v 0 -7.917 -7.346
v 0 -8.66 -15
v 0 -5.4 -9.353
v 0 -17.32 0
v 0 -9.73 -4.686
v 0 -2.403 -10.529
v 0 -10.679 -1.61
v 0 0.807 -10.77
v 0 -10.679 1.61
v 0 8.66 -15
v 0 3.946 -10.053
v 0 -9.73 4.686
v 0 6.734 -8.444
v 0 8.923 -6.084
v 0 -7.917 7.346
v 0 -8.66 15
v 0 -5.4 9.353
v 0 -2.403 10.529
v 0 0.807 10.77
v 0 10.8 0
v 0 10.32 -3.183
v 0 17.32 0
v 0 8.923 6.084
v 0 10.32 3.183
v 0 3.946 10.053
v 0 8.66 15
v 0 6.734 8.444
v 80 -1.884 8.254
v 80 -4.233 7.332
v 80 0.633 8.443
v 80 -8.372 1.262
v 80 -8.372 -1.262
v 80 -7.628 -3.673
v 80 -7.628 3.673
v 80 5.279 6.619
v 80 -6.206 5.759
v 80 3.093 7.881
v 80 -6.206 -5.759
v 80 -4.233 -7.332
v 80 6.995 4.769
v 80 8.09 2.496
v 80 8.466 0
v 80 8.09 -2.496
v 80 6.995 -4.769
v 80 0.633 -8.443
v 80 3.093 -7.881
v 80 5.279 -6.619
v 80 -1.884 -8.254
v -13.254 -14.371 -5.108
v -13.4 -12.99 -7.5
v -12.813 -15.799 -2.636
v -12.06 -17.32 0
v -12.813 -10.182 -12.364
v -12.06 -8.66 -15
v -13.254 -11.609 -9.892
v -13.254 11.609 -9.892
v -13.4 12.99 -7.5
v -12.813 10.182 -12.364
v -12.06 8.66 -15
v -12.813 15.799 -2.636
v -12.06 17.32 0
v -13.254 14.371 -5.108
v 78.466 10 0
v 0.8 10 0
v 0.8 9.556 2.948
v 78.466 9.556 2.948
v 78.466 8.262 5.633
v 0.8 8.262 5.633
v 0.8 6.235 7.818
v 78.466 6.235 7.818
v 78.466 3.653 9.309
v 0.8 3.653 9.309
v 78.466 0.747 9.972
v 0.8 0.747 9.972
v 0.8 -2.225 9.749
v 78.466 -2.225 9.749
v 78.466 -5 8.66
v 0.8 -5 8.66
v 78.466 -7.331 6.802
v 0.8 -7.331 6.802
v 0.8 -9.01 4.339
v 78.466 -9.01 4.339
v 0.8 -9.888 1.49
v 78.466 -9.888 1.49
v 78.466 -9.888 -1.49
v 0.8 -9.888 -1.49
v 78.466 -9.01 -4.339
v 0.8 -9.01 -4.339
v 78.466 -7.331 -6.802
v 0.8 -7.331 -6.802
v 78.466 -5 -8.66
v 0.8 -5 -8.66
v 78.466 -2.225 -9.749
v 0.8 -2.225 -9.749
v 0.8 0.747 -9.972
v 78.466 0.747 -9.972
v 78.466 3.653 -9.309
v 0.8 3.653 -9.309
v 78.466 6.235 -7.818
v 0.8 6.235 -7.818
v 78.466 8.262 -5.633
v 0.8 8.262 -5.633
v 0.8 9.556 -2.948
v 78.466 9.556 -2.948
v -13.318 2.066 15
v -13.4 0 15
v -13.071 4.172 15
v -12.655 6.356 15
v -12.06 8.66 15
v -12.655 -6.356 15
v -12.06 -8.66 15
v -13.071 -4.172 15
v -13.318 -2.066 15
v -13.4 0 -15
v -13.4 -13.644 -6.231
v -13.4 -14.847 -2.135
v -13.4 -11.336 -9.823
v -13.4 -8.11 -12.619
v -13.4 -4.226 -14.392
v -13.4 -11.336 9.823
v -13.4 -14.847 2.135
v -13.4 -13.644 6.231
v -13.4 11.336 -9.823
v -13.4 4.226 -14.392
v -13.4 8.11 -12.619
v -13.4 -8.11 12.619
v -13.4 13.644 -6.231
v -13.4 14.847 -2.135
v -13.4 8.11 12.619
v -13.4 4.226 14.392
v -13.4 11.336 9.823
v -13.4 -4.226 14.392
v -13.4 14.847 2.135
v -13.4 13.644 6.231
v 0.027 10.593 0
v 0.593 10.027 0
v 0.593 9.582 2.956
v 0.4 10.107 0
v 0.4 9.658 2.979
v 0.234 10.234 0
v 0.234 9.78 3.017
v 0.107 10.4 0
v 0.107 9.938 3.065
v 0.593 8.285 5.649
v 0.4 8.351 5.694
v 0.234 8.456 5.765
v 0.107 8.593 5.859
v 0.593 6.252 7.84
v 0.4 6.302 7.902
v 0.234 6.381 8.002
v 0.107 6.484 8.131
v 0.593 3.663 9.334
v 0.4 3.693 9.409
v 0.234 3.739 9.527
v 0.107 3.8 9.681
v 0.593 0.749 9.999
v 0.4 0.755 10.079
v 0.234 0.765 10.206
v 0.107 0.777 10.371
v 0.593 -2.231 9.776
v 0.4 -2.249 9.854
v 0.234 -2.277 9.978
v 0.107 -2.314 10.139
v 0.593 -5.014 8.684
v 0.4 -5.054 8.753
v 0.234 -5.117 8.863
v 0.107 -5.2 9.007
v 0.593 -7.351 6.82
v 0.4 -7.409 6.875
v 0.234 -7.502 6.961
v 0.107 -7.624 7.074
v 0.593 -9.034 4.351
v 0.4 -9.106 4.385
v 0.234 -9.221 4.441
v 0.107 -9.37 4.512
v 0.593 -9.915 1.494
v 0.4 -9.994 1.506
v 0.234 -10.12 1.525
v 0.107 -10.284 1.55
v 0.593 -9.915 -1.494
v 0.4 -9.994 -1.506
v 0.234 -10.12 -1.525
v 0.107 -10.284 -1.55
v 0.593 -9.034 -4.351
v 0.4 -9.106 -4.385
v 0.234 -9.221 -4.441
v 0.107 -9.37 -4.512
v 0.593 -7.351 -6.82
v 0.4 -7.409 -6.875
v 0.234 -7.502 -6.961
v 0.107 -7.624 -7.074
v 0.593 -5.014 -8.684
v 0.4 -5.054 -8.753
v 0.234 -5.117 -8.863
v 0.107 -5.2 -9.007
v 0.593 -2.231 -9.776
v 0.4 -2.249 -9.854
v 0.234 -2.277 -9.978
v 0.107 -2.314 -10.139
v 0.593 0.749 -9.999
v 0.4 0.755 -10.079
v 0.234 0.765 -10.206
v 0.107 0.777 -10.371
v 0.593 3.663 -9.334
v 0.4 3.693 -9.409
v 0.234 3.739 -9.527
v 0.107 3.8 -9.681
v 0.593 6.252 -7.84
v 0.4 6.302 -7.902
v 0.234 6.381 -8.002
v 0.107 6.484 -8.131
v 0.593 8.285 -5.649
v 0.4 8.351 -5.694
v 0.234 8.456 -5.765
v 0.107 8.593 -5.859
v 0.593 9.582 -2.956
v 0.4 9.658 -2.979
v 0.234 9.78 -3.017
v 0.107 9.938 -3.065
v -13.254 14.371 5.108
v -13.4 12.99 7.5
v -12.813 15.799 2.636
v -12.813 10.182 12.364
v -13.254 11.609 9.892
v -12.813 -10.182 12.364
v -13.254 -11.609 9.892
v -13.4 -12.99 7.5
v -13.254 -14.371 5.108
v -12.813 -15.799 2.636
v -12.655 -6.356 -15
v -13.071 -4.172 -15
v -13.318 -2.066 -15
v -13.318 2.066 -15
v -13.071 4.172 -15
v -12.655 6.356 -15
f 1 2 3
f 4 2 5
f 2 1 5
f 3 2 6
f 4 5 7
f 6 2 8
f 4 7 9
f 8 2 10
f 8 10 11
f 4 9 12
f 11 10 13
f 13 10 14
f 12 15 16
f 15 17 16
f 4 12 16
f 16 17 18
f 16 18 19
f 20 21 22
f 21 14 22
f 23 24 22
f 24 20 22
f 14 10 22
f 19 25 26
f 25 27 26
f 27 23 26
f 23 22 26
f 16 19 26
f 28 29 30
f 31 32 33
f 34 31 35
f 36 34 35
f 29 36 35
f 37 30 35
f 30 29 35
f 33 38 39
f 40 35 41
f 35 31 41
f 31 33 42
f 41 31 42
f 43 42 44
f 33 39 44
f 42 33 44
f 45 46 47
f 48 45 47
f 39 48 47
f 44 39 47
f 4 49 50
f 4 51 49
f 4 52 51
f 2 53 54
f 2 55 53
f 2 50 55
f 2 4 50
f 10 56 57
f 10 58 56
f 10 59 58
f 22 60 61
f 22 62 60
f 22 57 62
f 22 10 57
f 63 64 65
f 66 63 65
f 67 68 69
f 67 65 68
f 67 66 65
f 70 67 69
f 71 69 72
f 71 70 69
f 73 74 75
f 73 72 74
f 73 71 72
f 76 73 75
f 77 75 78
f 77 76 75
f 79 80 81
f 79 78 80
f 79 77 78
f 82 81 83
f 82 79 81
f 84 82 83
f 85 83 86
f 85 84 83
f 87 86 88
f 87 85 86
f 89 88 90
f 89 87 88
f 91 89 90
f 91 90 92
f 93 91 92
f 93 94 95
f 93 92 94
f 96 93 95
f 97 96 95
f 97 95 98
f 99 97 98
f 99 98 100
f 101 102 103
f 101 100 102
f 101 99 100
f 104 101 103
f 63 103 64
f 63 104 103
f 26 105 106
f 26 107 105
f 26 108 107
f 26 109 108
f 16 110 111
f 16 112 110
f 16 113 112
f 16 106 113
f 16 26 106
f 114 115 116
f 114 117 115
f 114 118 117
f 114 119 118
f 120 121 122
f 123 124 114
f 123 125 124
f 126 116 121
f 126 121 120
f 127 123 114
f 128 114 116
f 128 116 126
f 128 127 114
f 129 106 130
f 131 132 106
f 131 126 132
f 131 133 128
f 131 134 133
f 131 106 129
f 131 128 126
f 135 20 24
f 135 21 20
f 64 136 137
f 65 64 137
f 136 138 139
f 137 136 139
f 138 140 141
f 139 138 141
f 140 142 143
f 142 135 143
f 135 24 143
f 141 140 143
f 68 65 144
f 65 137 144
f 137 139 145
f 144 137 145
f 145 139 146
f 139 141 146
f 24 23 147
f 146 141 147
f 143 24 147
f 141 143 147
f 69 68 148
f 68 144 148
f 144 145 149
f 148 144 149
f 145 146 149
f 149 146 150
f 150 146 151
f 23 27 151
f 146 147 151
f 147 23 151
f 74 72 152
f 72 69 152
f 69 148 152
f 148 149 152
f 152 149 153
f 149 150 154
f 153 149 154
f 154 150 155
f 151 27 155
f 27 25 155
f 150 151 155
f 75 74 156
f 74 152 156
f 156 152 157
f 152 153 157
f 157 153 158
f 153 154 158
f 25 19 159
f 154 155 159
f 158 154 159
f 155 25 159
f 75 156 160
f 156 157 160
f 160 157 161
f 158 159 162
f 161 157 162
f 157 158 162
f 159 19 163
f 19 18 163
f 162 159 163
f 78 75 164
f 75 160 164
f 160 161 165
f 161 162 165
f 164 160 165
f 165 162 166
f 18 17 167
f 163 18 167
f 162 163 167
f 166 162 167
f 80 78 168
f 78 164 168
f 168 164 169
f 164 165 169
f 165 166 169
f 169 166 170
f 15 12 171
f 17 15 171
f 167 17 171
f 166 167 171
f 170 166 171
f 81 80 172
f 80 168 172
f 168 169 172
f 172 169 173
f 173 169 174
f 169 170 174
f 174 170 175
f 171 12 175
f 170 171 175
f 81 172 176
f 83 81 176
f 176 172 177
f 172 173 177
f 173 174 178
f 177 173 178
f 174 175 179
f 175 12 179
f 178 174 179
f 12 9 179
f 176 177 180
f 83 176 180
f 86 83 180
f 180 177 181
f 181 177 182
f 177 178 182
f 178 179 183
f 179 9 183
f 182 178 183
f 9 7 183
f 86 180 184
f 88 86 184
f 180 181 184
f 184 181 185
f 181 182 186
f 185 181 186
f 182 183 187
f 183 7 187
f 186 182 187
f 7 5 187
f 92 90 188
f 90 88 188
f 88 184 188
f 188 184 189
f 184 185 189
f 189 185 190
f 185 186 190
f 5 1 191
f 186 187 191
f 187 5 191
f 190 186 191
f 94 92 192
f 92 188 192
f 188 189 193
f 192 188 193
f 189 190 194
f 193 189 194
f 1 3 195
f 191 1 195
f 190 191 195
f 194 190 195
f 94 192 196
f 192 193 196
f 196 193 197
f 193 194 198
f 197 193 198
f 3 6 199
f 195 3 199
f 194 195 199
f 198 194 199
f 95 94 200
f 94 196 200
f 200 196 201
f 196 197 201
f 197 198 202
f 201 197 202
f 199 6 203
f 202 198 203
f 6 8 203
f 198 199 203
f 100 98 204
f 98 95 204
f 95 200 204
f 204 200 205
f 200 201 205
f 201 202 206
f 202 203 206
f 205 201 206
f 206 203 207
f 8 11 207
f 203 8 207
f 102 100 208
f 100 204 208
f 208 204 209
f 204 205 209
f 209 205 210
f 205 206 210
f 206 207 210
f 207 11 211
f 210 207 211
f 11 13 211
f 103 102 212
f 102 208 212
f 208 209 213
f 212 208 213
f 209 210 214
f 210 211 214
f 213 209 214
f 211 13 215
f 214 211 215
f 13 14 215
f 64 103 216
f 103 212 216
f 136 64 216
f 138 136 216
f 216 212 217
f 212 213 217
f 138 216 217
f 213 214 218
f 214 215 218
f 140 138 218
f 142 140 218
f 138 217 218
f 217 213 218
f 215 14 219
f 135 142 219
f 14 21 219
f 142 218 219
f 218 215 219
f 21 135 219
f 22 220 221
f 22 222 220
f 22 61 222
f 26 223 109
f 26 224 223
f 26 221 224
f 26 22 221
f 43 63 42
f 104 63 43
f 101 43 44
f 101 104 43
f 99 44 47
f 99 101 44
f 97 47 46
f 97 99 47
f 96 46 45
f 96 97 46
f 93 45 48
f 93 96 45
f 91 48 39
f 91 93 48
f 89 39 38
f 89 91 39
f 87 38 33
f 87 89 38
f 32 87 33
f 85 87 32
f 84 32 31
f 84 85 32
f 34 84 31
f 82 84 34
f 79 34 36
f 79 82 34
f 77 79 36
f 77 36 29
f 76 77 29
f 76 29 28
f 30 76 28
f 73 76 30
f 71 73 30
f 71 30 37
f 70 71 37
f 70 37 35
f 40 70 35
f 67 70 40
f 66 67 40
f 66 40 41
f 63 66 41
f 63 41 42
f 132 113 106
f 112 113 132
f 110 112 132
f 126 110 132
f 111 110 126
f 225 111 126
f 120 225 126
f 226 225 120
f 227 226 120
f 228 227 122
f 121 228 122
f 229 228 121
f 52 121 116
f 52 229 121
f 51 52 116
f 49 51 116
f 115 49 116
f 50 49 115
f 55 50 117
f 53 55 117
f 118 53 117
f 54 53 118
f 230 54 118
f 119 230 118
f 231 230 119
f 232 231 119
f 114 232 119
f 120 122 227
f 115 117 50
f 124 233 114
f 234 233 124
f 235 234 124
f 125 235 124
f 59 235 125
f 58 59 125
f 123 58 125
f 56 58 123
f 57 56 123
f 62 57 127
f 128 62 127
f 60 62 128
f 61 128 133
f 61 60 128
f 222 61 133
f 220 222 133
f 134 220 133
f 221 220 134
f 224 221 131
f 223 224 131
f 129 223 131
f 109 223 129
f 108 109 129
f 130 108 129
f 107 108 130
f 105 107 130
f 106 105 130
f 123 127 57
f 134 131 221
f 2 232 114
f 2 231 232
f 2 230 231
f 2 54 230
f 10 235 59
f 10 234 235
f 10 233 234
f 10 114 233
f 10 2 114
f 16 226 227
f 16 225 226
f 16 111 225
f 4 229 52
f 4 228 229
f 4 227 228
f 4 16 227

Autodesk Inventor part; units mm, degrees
ref_plane "YZ Plane" through (0, 0, 0) normal (1, 0, 0) x (0, 1, 0)
ref_plane "XZ Plane" through (0, 0, 0) normal (0, 1, 0) x (-1, 0, 0)
sketch "Sketch1" plane through (0, 0, 0) normal (0, 0, 1) x (1, 0, 0)
  line L0 (0, 10) -> (80, 10)
  line L1 (80, 10) -> (80, 0)
  line L2 (80, 0) -> (0, 0)
  line L3 (-16, 0) -> (96, 0) projected
  line L4 (0, -2) -> (0, 12) projected
  line L5 (0, 10) -> (0, 0)
  dimension "d2" = 20
  dimension "d59" = 80
revolve "Body" add sketch "Sketch1" angle 360 about axis through (80, 0, 0) along (-1, 0, 0)
sketch "Sketch2" plane through (0, 0, 0) normal (-1, 0, 0) x (0, 0, 1)
  line L0 (0, 17.3205) -> (15, 8.6603)
  line L1 (15, 8.6603) -> (15, -8.6603)
  line L2 (15, -8.6603) -> (0, -17.3205)
  line L3 (0, -17.3205) -> (-15, -8.6603)
  line L4 (-15, -8.6603) -> (-15, 8.6603)
  line L5 (-15, 8.6603) -> (0, 17.3205)
  line L6 (-21, 0) -> (21, 0) projected
  line L7 (0, 24.2487) -> (0, -24.2487) projected
  point P0 (0, 0)
  point P1 (0, 0)
  dimension "d11" = 30
extrude "Head" add sketch "Sketch2" along normal blind 13.4
sketch "Sketch4" plane through (0, 0, 0) normal (0, 0, 1) x (1, 0, 0)
  line L0 (-11.6679, 18) -> (-13.4, 15)
  line L1 (-1.1, 0) -> (-0.234, 0)
  line L2 (-16.0332, 0) -> (2.3992, 0) projected
  line L3 (-13.4, 18) -> (-11.6679, 18)
  line L4 (-13.4, 15) -> (-13.4, 18)
  line L5 (0, 21.6) -> (0, -3.6) projected
  dimension "d65" = 30
  dimension "d67" = 30
  dimension "d68" = 36
  dimension "d69" = 13.4
revolve "Chamfer1" cut sketch "Sketch4" angle 360 about axis through (-1.1, 0, 0) along (1, 0, 0)
thread "Thread" size "M20x2.5" class "6g" standard "ISO Metric profile" length 46
chamfer "Chamfer2" distance 1.5336 distance2 1.5337 1 edges at (80, -10, 0) measured on face at (80, -2.8768, 3.7595)
fillet "Fillet" radius 0.8 1 edges at (0, -10, 0)
ref_plane "Work Plane1" through (1.525, 0, 0) normal (0, 0, 1) x (1, 0, 0)
equation "\"d2\" = GD"
equation "\"d59\" = NLG"
equation "\"d11\" = SW"
equation "\"d3\" = KOH"
equation "\"d15\" = GEL"
equation "\"d6\" = -0.5 * SPD + 0.5 * GD"
equation "\"d71\" = RR1"
equation "\"d65\" = SW"
equation "\"d67\" = ANG1"
equation "\"d68\" = 1.2 * SW"
equation "\"d69\" = KOH"
equation "\"NLG\" = 80"
equation "\"GD\" = NND"
equation "\"KOH\" = 13.4"
equation "\"GEL\" = 46"
equation "\"SW\" = 30"
equation "\"SPD\" = NND - 1.2269 * PTC"
equation "\"SD\" = 0"
equation "\"ANG1\" = 30deg"
equation "\"GAL\" = 0.61345 * PTC"
equation "\"GUL\" = 0.61345 * PTC"
equation "\"RR\" = 0.1"
equation "\"RR1\" = 0.8"
equation "\"GD1\" = THREADDIA - 1.2269 * PTC"
equation "\"TOA\" = 30deg"
equation "\"PTC\" = 2.5"
equation "\"KOH1\" = 8.8"
equation "\"E0\" = 1.155 * SW"
equation "\"NND\" = 20"
equation "\"THREADDIA\" = 20"
properties part number "ANSI B18.2.3.5M - M20 x 2,5 x 80" material "Steel, Mild"
